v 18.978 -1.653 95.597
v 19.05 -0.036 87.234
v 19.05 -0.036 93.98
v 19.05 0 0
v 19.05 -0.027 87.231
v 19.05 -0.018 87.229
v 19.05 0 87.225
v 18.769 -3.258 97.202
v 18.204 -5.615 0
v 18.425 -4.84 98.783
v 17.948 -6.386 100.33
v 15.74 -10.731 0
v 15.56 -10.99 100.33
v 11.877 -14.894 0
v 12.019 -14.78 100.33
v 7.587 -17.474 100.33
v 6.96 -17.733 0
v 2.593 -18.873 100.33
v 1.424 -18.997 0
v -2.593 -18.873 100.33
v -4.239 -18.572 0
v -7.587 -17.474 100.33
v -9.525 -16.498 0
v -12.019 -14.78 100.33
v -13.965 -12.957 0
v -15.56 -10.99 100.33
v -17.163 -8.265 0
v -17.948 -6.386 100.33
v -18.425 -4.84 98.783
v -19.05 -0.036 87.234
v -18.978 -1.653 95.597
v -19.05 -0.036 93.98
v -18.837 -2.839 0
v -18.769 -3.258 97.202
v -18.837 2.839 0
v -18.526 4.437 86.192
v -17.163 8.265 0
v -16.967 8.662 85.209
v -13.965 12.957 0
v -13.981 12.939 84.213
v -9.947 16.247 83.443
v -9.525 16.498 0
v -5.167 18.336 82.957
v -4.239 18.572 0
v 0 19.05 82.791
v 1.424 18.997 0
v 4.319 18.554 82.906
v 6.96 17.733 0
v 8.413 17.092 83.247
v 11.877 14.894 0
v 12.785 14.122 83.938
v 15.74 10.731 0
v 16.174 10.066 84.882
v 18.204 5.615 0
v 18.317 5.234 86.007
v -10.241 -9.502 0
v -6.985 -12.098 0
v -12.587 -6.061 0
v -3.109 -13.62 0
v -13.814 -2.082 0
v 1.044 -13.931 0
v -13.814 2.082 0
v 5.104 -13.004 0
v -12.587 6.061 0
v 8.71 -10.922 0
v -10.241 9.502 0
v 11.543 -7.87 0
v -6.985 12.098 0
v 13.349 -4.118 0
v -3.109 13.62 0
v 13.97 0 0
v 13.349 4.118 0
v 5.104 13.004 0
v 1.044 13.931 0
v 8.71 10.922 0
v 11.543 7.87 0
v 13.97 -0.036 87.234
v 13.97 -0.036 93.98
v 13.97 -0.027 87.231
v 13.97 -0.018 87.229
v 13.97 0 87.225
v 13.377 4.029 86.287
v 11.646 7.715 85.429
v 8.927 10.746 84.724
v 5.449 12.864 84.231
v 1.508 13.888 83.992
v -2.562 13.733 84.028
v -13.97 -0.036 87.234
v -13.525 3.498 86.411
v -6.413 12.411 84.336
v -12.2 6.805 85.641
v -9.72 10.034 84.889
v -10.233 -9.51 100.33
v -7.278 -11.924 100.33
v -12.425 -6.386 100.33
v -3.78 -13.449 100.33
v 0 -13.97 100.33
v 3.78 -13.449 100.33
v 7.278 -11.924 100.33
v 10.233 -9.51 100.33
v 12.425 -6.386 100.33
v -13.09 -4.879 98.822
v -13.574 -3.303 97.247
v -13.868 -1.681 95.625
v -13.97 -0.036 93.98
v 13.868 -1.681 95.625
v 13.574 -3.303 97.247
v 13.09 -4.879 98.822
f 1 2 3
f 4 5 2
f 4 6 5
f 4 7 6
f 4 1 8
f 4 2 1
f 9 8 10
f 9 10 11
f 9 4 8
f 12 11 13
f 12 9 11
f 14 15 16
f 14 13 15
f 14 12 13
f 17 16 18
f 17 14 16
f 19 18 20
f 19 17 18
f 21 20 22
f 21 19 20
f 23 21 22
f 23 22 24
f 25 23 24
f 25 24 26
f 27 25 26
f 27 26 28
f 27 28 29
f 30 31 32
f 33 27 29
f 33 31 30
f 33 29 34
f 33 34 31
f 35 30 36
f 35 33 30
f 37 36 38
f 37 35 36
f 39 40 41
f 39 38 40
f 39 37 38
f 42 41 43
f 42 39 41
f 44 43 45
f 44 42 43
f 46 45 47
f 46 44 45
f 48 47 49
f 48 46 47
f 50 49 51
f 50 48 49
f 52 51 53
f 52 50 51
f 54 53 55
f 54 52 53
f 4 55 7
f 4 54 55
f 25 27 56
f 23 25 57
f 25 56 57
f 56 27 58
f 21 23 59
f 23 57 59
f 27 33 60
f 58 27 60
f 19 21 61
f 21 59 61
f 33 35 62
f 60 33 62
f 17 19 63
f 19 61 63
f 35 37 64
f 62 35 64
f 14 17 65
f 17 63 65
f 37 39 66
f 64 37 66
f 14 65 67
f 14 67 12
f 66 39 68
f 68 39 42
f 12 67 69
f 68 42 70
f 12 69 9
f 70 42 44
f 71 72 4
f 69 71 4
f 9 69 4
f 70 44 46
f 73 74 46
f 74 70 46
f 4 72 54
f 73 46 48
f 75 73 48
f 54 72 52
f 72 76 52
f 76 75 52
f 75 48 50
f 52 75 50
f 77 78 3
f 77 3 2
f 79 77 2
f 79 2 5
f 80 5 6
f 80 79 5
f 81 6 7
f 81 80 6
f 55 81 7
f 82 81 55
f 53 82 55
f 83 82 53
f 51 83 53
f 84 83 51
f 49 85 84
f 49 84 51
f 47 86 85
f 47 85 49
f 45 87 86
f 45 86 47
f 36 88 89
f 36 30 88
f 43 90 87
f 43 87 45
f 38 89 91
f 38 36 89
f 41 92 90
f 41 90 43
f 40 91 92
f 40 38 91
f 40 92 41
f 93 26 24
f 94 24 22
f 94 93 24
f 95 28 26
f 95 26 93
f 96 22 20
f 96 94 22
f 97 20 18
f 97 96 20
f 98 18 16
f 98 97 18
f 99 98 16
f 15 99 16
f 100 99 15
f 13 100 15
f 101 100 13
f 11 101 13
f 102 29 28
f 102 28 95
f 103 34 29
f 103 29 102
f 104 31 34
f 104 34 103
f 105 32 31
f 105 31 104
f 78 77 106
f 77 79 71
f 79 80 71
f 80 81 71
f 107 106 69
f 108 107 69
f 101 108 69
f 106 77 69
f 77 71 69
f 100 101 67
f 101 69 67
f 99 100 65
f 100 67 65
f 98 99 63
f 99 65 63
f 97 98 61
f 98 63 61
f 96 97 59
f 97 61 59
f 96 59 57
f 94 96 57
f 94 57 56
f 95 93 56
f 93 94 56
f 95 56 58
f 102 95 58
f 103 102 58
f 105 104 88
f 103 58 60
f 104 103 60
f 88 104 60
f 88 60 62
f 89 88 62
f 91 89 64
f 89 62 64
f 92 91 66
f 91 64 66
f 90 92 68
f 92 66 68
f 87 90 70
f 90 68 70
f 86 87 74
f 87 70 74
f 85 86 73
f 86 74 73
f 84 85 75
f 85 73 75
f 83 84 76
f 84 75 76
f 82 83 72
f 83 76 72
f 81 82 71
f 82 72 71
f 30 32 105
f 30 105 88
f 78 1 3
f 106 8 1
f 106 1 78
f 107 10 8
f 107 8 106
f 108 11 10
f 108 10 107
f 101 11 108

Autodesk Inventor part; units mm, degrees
ref_plane "YZ Plane" through (0, 0, 0) normal (1, 0, 0) x (0, 1, 0)
ref_plane "XZ Plane" through (0, 0, 0) normal (0, 1, 0) x (-1, 0, 0)
ref_plane "XY Plane" through (0, 0, 0) normal (0, 0, 1) x (1, 0, 0)
sketch "Sketch1" plane through (0, 0, 0) normal (0, 0, 1) x (1, 0, 0)
  circle A0 centre (0, 0) radius 13.97
  circle A1 centre (0, 0) radius 19.05
  dimension "d0" = 27.94
  dimension "d1" = 38.1
extrude "Extrusion1" add sketch "Sketch1" along normal blind 100.33
sketch "Sketch2" plane through (0, 0, 0) normal (1, 0, 0) x (0, 1, 0)
  line L0 (-19.05, 100.33) -> (19.05, 100.33) projected
  line L1 (19.05, 0) -> (19.05, 100.33) projected
  line L2 (-0.0364, 100.33) -> (-0.0364, 87.2336)
  line L3 (-0.0364, 87.2336) -> (19.05, 82.7907)
  line L4 (-0.0364, 100.33) -> (19.05, 100.33)
  point P0 (0, 0)
extrude "Extrusion2" cut sketch "Sketch2" along normal through all both and the other way through all
chamfer "Chamfer1" distance 6.35 angle 45 2 edges at (16.51, -0.0364, 100.33) (-16.51, -0.0364, 100.33)
